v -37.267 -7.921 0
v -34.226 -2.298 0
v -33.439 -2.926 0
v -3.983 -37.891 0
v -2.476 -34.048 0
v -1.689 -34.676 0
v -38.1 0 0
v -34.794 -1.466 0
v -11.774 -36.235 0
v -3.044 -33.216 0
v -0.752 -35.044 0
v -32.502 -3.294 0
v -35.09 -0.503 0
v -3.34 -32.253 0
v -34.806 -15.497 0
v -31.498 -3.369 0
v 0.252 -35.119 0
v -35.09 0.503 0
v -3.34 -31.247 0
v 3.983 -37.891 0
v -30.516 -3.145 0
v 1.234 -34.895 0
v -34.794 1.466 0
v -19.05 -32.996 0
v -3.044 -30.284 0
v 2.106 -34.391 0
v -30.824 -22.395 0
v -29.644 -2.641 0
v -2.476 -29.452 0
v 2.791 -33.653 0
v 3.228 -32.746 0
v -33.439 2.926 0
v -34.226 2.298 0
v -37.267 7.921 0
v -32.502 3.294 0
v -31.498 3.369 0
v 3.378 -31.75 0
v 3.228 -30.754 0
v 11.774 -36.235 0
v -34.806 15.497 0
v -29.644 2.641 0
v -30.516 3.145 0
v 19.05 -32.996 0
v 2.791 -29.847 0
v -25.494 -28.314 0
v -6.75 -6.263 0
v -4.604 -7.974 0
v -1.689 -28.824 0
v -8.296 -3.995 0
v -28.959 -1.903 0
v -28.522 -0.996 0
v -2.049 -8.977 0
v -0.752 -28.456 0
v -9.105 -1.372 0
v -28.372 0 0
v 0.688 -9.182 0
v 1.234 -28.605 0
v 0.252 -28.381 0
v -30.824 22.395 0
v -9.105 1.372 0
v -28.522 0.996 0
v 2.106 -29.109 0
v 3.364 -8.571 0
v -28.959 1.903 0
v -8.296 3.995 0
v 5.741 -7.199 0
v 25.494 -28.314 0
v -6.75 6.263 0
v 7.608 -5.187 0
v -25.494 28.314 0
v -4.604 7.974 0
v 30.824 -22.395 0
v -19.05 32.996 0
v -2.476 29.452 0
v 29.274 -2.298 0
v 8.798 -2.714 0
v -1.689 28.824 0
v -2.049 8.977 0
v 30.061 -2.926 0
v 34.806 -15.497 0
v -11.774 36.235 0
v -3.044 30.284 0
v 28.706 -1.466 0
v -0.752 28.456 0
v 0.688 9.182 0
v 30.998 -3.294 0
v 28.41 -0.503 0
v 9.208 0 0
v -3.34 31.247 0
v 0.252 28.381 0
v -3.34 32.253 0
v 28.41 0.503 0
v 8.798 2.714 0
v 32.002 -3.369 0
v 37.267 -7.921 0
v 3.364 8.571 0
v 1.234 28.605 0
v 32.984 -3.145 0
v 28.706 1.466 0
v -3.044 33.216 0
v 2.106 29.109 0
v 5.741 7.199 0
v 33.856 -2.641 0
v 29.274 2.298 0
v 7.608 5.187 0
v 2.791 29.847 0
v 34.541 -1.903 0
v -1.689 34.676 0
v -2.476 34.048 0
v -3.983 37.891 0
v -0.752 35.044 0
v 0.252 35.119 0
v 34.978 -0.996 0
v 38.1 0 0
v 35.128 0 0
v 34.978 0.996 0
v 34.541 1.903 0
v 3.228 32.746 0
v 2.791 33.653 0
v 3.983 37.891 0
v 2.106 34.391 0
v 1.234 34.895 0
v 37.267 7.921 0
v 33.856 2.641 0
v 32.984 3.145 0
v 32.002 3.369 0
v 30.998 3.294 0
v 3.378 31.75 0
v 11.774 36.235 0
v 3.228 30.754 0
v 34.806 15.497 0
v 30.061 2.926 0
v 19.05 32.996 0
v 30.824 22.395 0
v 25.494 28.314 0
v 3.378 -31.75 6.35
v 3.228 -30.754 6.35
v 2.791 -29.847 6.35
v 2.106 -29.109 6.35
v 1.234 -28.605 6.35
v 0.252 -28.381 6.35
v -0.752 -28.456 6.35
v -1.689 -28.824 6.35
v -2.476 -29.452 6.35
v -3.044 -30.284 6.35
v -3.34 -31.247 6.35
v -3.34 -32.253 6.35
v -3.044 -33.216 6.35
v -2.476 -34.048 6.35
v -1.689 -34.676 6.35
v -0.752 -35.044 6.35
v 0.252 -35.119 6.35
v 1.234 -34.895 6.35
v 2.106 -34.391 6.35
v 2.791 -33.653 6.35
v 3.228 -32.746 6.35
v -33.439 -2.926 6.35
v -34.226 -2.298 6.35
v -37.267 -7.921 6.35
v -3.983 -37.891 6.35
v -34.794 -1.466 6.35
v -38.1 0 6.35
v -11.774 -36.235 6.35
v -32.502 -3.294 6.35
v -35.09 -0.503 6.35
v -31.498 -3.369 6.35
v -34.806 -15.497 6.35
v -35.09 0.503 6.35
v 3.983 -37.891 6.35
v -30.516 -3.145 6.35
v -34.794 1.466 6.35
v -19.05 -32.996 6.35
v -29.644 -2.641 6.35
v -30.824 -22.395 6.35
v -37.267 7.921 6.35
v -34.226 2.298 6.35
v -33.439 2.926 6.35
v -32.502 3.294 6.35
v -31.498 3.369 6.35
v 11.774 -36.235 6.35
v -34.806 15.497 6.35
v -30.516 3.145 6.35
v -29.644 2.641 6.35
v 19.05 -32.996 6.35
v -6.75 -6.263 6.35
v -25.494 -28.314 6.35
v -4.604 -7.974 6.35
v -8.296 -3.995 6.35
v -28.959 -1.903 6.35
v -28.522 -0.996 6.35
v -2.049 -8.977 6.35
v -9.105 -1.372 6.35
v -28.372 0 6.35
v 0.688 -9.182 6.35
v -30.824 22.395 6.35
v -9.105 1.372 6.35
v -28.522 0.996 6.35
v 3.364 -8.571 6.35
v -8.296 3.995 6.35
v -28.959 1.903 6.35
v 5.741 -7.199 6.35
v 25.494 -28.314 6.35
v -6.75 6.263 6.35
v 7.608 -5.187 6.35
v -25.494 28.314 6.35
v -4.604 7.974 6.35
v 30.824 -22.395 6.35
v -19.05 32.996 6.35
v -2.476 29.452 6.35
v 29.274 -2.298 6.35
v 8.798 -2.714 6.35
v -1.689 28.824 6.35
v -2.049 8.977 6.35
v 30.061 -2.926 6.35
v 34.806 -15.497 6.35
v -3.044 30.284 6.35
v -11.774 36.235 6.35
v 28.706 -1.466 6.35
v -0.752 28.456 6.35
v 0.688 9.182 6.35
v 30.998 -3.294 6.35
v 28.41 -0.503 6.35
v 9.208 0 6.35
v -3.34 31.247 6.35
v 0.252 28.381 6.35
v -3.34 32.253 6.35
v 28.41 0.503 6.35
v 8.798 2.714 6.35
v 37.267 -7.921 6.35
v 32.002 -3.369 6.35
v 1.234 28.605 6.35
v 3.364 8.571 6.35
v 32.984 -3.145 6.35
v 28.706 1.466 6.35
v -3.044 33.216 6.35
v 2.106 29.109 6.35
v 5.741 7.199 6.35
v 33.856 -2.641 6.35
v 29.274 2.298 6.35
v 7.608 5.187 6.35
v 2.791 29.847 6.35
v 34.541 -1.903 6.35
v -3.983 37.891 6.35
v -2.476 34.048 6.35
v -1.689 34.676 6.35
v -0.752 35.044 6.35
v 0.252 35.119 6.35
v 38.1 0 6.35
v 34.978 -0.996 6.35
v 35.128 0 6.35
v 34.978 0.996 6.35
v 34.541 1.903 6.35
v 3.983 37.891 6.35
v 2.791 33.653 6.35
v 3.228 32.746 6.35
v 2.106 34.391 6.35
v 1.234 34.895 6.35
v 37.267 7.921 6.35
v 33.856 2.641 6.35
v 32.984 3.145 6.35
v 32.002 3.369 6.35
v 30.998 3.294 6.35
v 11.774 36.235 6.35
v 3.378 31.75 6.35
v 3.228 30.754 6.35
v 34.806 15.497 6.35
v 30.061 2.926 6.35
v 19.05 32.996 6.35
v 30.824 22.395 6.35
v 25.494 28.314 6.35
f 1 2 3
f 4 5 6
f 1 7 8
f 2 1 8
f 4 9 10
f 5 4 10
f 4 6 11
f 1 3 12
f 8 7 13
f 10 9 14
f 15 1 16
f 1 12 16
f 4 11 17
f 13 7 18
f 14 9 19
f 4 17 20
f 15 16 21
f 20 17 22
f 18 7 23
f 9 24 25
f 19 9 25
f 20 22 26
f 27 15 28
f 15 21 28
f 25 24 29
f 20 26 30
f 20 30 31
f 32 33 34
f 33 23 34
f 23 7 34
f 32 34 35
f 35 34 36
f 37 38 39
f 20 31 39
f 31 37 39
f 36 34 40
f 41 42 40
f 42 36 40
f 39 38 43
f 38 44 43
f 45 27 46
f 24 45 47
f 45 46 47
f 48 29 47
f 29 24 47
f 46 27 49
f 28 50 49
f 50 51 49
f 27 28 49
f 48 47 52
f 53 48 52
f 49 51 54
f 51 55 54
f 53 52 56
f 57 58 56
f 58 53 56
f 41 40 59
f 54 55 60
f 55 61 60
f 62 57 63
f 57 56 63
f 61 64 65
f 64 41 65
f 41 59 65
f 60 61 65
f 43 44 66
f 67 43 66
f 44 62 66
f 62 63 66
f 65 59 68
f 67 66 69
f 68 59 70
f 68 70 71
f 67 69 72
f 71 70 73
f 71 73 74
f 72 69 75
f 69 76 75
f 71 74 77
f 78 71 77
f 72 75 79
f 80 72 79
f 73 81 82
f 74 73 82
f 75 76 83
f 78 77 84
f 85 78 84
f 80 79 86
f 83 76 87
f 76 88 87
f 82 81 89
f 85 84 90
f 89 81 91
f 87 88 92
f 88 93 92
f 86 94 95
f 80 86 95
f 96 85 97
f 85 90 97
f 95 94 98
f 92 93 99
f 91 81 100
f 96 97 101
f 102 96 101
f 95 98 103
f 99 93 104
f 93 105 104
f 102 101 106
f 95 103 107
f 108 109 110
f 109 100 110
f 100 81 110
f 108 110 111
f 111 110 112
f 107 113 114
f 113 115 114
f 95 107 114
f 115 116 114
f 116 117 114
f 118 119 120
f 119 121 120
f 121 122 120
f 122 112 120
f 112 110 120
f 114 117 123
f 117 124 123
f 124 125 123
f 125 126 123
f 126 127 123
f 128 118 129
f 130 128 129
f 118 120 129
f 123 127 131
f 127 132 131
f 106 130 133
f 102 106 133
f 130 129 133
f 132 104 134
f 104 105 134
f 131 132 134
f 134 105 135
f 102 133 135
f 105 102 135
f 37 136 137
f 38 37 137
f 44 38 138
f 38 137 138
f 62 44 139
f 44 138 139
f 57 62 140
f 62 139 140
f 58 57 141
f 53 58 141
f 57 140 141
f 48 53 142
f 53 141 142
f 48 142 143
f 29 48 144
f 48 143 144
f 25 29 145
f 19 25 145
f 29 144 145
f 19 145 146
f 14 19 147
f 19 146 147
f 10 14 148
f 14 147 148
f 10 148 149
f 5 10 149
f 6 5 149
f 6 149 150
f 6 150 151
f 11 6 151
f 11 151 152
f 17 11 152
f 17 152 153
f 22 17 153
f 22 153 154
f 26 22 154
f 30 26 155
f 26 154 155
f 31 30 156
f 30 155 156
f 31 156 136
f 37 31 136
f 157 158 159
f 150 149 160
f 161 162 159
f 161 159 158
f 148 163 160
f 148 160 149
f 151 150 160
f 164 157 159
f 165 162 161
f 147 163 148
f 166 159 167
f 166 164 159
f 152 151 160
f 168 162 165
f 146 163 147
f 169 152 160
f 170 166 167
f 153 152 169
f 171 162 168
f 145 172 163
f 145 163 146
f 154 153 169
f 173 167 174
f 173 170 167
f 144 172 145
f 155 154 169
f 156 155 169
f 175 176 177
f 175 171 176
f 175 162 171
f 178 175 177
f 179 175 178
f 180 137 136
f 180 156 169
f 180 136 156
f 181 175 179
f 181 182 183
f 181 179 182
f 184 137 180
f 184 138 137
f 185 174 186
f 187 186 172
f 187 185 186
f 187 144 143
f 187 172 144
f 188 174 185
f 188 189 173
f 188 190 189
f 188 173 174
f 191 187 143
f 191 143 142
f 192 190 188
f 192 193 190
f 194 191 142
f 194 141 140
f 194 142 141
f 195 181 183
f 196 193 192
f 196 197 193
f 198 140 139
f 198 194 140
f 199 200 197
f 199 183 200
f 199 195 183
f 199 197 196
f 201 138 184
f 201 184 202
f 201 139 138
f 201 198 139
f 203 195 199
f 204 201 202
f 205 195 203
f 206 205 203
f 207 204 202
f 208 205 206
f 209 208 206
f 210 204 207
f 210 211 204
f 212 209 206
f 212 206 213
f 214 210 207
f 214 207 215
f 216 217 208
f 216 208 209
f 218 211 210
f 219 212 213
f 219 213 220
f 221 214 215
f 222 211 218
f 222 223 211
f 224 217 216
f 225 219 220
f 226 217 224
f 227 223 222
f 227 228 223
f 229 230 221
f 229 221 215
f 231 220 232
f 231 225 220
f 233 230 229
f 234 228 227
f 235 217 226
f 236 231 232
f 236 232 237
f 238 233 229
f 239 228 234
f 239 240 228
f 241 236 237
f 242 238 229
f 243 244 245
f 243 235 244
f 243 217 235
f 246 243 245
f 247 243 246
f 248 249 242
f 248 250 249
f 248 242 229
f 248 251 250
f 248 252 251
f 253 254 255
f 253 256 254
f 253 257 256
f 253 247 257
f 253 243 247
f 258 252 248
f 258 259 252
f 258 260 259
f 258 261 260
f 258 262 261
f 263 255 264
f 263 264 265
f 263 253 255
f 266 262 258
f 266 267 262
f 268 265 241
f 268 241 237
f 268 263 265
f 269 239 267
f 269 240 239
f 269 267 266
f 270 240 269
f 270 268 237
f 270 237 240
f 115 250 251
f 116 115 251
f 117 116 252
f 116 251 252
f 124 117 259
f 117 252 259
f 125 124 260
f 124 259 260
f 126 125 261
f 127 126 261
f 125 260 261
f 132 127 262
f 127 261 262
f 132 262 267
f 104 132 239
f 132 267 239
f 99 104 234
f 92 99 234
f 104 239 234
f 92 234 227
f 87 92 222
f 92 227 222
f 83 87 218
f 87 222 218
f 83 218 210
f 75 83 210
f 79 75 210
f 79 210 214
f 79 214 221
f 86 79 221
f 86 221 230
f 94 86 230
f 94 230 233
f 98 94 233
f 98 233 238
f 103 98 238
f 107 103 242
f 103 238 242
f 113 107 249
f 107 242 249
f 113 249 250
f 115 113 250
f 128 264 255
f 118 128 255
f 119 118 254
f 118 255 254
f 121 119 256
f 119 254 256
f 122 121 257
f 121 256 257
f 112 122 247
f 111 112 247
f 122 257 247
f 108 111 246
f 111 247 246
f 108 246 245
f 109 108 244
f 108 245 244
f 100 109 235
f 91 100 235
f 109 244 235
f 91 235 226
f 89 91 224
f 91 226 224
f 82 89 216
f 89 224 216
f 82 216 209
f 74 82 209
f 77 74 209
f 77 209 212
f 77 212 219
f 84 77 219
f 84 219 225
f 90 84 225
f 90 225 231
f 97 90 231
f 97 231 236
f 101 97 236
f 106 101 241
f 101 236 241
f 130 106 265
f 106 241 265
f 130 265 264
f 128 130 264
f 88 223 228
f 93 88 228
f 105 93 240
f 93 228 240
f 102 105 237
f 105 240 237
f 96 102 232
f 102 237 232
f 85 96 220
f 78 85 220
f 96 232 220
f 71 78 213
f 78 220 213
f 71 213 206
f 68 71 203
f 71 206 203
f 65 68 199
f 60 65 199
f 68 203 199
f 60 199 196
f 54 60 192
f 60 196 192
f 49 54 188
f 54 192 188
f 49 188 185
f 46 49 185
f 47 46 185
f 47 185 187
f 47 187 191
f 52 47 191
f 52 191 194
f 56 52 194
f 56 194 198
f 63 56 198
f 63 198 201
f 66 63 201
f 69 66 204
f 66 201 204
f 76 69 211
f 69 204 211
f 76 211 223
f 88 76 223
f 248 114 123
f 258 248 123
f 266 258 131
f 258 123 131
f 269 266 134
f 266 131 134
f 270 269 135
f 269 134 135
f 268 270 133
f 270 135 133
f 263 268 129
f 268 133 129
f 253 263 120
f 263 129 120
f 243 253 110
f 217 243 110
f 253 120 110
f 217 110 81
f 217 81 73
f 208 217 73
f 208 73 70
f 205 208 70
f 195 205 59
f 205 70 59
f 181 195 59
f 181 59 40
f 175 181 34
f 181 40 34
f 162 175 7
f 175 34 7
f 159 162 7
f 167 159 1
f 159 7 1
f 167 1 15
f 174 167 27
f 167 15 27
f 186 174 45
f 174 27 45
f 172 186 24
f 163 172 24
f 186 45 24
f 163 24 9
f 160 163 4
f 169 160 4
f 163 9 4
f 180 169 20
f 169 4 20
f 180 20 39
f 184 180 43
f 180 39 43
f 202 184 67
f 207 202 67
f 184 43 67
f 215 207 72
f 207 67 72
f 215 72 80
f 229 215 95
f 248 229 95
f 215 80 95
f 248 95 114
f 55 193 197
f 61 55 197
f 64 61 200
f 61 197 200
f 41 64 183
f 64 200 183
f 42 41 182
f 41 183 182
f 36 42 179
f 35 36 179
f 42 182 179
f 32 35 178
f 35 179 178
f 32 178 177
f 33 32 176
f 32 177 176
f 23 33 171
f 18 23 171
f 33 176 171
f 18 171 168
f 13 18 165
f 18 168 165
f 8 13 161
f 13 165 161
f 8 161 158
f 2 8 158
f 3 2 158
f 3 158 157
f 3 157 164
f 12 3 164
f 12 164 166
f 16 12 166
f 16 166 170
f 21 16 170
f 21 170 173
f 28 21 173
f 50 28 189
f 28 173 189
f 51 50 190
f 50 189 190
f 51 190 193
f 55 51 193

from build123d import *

# Parameters (mm, degrees)
SKETCH1_R           = 38.1
BOSS_EXTRUDE1_DEPTH = 6.35
SKETCH2_R           = 3.3782
CUT_EXTRUDE1_DEPTH  = 6.35
SKETCH3_R           = 9.2075
CUT_EXTRUDE2_DEPTH  = 6.35


with BuildPart() as part:
    # Sketch1 → Boss-Extrude1 (new body)
    with BuildSketch(Plane.XY):
        Circle(SKETCH1_R)
    extrude(amount=BOSS_EXTRUDE1_DEPTH)

    # Sketch2 → Cut-Extrude1 (cut)
    with BuildSketch(Plane.XY.offset(6.35)):
        with Locations((0, 31.75)):
            Circle(SKETCH2_R)
        with Locations((31.75, 0)):
            Circle(SKETCH2_R)
        with Locations((0, -31.75)):
            Circle(SKETCH2_R)
        with Locations((-31.75, 0)):
            Circle(SKETCH2_R)
    extrude(amount=-CUT_EXTRUDE1_DEPTH, mode=Mode.SUBTRACT)

    # Sketch3 → Cut-Extrude2 (cut)
    with BuildSketch(Plane.XY.offset(6.35)):
        Circle(SKETCH3_R)
    extrude(amount=-CUT_EXTRUDE2_DEPTH, mode=Mode.SUBTRACT)


solid = part.part
